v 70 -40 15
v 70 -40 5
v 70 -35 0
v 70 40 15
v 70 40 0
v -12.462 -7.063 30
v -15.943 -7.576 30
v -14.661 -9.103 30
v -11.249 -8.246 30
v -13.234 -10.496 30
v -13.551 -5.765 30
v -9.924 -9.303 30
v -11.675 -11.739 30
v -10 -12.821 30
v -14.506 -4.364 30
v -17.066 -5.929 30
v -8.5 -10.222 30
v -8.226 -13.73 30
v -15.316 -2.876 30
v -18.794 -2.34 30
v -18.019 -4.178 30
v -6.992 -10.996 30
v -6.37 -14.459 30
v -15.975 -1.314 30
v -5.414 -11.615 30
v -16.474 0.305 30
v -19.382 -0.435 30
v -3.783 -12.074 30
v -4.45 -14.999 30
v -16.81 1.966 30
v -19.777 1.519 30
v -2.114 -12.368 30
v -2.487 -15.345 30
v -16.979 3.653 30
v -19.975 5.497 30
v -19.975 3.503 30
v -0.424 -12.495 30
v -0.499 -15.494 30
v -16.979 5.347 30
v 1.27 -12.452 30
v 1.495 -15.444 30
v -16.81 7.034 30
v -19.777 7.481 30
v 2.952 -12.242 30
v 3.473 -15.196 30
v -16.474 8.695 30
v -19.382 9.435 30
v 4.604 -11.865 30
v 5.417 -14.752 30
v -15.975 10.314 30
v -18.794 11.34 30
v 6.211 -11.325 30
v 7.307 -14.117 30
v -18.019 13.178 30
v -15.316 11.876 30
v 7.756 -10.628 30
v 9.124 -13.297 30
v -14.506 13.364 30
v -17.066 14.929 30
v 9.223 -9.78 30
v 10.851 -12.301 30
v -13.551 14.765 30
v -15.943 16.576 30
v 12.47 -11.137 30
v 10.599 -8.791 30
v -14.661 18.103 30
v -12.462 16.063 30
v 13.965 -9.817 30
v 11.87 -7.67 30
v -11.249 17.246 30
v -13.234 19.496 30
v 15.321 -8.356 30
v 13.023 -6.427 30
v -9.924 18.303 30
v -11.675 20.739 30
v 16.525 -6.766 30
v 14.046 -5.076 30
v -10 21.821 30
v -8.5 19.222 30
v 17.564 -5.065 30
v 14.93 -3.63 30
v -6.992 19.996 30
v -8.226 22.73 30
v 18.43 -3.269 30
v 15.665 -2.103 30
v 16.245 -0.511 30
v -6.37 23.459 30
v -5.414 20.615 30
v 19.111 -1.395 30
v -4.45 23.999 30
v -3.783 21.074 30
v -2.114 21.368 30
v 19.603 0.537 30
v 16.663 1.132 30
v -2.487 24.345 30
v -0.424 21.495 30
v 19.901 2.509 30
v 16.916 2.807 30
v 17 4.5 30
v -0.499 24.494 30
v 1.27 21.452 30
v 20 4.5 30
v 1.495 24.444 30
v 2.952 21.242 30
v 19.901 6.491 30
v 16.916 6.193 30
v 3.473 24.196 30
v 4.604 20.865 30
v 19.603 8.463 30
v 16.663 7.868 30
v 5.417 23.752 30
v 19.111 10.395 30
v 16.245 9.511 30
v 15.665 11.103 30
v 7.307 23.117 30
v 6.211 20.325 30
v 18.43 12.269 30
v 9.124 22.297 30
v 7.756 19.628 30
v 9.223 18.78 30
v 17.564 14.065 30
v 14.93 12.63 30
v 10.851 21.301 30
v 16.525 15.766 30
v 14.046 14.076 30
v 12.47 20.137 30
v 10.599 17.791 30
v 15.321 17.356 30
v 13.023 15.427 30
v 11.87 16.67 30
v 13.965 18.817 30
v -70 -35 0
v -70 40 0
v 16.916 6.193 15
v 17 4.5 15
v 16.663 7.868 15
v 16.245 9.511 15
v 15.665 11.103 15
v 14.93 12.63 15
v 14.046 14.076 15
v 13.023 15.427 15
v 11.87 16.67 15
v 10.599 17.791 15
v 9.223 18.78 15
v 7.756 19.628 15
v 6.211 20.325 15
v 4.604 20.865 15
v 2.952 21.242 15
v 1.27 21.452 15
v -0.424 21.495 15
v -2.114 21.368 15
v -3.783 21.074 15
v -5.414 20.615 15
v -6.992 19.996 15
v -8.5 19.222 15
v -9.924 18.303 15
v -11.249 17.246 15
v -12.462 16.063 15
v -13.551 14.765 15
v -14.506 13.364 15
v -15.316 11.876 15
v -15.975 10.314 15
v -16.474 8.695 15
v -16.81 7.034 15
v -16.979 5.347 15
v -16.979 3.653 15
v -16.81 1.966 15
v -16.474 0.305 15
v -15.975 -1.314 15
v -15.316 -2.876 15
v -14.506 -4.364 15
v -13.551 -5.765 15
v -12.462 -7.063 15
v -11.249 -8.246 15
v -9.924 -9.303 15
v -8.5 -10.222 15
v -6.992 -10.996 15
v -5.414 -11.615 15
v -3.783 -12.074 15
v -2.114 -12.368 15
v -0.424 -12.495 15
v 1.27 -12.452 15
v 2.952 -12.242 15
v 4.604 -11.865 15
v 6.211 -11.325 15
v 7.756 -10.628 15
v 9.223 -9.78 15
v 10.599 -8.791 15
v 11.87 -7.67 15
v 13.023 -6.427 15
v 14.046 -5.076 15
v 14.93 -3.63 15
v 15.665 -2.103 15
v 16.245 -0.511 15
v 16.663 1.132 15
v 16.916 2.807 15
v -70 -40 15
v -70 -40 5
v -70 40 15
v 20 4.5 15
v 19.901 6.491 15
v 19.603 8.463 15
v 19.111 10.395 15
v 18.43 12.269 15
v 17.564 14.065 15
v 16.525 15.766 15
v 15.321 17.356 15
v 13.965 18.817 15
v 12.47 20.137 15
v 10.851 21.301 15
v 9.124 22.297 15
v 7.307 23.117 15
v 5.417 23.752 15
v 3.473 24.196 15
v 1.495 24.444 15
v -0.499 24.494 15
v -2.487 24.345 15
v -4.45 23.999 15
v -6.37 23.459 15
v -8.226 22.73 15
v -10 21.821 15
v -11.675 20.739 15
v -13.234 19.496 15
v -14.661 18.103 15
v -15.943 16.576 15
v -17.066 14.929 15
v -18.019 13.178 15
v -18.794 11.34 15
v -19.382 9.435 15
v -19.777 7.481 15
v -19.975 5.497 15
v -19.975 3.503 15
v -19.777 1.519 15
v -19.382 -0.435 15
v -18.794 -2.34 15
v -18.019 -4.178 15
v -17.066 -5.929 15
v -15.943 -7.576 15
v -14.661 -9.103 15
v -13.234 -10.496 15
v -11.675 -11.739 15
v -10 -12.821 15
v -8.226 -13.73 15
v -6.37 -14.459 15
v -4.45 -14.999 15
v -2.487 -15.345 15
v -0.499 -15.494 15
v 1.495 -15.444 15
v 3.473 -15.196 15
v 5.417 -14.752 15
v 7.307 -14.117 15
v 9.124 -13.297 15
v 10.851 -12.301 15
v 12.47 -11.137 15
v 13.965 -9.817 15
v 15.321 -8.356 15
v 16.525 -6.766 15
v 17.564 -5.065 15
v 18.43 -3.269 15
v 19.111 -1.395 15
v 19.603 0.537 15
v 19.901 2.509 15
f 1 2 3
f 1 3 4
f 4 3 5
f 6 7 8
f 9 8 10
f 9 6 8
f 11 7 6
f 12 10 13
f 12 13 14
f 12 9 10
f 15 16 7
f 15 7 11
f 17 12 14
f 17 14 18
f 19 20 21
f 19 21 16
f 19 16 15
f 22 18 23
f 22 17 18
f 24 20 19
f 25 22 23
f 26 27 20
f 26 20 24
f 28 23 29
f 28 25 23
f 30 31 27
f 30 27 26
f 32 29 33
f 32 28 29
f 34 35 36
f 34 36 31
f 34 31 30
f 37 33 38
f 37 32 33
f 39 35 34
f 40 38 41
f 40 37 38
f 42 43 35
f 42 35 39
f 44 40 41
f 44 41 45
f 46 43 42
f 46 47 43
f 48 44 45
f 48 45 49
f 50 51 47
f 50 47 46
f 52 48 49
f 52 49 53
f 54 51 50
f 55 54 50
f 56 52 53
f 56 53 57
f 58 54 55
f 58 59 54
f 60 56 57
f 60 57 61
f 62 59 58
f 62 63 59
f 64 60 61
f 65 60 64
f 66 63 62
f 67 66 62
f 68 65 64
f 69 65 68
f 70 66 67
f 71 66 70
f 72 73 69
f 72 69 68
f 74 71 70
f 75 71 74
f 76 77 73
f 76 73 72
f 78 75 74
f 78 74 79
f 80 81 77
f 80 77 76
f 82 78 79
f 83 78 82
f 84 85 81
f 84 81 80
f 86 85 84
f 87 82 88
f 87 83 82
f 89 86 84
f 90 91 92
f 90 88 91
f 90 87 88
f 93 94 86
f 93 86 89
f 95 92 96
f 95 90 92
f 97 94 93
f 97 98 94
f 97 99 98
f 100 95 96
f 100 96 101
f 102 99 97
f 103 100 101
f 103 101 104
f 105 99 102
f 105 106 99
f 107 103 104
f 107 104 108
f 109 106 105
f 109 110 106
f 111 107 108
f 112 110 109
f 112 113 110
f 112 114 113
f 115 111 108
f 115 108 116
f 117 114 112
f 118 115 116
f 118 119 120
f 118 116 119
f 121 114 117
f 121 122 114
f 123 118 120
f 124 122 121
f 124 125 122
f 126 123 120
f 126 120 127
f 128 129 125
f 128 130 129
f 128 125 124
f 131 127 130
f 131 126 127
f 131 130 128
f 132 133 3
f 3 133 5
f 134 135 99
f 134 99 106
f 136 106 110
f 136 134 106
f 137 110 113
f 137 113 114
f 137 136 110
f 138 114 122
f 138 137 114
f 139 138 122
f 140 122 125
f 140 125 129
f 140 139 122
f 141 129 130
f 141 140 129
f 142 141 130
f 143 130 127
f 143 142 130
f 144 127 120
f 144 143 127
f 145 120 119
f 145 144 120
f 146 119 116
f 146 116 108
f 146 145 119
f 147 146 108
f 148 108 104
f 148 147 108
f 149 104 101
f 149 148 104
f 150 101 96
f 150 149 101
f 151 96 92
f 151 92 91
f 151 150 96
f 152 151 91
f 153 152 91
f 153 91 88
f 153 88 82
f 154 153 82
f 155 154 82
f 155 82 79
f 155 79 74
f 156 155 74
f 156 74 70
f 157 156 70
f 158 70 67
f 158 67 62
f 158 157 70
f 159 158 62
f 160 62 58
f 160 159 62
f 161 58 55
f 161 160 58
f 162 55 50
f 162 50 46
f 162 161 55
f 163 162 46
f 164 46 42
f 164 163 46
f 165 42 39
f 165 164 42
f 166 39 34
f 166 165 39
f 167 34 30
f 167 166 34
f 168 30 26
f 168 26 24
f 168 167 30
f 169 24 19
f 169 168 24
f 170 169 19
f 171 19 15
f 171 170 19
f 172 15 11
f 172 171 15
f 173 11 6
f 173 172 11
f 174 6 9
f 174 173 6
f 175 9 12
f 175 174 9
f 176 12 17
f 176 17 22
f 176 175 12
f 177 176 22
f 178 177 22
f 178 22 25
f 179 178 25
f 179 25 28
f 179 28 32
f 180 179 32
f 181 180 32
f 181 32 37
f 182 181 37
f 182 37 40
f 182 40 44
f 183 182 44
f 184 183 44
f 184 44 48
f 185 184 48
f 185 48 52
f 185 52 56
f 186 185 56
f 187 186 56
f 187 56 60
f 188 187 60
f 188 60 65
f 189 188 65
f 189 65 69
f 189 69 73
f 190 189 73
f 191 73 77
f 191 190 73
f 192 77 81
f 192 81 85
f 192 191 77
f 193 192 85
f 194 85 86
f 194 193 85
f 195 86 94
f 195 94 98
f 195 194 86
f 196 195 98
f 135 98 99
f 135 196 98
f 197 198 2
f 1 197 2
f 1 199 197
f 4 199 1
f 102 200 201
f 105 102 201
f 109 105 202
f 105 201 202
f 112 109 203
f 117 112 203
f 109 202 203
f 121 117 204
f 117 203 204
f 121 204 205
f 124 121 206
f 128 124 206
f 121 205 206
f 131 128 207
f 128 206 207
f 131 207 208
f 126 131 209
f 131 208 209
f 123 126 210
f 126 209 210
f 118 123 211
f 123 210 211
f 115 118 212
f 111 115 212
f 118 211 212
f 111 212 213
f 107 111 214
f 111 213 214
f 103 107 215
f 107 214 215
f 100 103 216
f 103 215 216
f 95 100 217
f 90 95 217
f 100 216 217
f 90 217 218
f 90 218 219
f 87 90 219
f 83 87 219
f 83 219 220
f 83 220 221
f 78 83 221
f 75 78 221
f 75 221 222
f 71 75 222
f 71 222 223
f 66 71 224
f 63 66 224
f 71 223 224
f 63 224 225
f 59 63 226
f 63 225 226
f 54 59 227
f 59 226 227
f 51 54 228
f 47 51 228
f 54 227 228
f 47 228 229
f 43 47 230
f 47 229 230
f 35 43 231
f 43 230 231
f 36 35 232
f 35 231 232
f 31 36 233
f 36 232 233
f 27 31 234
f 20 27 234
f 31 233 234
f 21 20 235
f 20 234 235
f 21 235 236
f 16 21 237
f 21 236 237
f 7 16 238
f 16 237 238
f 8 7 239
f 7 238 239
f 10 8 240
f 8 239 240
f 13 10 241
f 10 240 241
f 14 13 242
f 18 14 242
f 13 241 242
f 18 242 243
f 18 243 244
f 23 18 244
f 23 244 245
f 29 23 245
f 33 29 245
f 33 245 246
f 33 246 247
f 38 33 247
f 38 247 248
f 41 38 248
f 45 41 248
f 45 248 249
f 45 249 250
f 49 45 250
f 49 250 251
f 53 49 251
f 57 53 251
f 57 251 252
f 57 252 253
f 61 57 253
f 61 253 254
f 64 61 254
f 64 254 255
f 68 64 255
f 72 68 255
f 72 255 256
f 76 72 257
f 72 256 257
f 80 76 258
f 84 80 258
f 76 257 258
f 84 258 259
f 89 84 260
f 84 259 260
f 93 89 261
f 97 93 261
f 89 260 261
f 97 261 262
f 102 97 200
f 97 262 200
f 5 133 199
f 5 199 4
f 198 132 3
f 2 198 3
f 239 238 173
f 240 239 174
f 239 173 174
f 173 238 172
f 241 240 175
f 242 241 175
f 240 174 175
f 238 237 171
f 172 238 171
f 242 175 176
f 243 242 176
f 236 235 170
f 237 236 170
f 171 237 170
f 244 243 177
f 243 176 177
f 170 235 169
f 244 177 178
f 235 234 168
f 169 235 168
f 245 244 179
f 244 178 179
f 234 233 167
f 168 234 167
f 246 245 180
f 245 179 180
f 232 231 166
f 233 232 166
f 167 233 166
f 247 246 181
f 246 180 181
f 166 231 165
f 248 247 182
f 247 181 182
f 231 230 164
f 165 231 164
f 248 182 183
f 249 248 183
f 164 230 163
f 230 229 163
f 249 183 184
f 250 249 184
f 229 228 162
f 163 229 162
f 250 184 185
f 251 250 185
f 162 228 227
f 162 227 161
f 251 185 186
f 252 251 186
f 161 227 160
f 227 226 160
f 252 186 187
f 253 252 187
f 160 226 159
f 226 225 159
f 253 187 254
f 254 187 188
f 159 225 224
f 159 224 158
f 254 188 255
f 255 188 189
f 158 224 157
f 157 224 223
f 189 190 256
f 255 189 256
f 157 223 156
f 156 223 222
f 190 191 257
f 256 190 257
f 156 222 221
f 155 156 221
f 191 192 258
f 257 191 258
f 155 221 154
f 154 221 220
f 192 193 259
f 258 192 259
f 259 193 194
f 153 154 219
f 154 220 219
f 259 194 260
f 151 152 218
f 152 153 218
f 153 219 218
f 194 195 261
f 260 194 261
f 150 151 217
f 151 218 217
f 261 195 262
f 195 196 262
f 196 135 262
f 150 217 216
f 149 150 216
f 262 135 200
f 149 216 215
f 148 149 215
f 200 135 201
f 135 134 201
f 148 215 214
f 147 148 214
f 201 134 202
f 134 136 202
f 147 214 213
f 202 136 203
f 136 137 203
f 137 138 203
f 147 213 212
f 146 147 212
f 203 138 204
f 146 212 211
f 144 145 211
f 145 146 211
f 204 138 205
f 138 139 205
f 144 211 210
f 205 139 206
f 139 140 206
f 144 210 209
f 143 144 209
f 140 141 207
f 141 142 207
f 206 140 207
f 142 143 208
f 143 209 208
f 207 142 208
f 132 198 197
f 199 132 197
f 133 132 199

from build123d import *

# Parameters (mm, degrees)
F0_W     = 140
F0_H     = 80
F1_DEPTH = 15
F2_SIZE  = 5
F3_R     = 20
F3_R_2   = 17
F4_DEPTH = 15


with BuildPart() as f1:
    # F0 (on Top) → F1 (new body)
    with BuildSketch(Plane.XY):
        Rectangle(F0_W, F0_H)
    extrude(amount=F1_DEPTH)

    # F2
    f2_edges = [f1.edges().sort_by_distance(p)[0] for p in [
        (0, -40, 0),
    ]]
    chamfer(f2_edges, length=F2_SIZE)


with BuildPart() as f4:
    # F3 (on face) → F4 (new body)
    with BuildSketch(Plane.XY.offset(15)):
        with Locations((0, 4.5)):
            Circle(F3_R)
        with Locations((0, 4.5)):
            Circle(F3_R_2, mode=Mode.SUBTRACT)
    extrude(amount=F4_DEPTH)


solid = Compound([f1.part, f4.part])
